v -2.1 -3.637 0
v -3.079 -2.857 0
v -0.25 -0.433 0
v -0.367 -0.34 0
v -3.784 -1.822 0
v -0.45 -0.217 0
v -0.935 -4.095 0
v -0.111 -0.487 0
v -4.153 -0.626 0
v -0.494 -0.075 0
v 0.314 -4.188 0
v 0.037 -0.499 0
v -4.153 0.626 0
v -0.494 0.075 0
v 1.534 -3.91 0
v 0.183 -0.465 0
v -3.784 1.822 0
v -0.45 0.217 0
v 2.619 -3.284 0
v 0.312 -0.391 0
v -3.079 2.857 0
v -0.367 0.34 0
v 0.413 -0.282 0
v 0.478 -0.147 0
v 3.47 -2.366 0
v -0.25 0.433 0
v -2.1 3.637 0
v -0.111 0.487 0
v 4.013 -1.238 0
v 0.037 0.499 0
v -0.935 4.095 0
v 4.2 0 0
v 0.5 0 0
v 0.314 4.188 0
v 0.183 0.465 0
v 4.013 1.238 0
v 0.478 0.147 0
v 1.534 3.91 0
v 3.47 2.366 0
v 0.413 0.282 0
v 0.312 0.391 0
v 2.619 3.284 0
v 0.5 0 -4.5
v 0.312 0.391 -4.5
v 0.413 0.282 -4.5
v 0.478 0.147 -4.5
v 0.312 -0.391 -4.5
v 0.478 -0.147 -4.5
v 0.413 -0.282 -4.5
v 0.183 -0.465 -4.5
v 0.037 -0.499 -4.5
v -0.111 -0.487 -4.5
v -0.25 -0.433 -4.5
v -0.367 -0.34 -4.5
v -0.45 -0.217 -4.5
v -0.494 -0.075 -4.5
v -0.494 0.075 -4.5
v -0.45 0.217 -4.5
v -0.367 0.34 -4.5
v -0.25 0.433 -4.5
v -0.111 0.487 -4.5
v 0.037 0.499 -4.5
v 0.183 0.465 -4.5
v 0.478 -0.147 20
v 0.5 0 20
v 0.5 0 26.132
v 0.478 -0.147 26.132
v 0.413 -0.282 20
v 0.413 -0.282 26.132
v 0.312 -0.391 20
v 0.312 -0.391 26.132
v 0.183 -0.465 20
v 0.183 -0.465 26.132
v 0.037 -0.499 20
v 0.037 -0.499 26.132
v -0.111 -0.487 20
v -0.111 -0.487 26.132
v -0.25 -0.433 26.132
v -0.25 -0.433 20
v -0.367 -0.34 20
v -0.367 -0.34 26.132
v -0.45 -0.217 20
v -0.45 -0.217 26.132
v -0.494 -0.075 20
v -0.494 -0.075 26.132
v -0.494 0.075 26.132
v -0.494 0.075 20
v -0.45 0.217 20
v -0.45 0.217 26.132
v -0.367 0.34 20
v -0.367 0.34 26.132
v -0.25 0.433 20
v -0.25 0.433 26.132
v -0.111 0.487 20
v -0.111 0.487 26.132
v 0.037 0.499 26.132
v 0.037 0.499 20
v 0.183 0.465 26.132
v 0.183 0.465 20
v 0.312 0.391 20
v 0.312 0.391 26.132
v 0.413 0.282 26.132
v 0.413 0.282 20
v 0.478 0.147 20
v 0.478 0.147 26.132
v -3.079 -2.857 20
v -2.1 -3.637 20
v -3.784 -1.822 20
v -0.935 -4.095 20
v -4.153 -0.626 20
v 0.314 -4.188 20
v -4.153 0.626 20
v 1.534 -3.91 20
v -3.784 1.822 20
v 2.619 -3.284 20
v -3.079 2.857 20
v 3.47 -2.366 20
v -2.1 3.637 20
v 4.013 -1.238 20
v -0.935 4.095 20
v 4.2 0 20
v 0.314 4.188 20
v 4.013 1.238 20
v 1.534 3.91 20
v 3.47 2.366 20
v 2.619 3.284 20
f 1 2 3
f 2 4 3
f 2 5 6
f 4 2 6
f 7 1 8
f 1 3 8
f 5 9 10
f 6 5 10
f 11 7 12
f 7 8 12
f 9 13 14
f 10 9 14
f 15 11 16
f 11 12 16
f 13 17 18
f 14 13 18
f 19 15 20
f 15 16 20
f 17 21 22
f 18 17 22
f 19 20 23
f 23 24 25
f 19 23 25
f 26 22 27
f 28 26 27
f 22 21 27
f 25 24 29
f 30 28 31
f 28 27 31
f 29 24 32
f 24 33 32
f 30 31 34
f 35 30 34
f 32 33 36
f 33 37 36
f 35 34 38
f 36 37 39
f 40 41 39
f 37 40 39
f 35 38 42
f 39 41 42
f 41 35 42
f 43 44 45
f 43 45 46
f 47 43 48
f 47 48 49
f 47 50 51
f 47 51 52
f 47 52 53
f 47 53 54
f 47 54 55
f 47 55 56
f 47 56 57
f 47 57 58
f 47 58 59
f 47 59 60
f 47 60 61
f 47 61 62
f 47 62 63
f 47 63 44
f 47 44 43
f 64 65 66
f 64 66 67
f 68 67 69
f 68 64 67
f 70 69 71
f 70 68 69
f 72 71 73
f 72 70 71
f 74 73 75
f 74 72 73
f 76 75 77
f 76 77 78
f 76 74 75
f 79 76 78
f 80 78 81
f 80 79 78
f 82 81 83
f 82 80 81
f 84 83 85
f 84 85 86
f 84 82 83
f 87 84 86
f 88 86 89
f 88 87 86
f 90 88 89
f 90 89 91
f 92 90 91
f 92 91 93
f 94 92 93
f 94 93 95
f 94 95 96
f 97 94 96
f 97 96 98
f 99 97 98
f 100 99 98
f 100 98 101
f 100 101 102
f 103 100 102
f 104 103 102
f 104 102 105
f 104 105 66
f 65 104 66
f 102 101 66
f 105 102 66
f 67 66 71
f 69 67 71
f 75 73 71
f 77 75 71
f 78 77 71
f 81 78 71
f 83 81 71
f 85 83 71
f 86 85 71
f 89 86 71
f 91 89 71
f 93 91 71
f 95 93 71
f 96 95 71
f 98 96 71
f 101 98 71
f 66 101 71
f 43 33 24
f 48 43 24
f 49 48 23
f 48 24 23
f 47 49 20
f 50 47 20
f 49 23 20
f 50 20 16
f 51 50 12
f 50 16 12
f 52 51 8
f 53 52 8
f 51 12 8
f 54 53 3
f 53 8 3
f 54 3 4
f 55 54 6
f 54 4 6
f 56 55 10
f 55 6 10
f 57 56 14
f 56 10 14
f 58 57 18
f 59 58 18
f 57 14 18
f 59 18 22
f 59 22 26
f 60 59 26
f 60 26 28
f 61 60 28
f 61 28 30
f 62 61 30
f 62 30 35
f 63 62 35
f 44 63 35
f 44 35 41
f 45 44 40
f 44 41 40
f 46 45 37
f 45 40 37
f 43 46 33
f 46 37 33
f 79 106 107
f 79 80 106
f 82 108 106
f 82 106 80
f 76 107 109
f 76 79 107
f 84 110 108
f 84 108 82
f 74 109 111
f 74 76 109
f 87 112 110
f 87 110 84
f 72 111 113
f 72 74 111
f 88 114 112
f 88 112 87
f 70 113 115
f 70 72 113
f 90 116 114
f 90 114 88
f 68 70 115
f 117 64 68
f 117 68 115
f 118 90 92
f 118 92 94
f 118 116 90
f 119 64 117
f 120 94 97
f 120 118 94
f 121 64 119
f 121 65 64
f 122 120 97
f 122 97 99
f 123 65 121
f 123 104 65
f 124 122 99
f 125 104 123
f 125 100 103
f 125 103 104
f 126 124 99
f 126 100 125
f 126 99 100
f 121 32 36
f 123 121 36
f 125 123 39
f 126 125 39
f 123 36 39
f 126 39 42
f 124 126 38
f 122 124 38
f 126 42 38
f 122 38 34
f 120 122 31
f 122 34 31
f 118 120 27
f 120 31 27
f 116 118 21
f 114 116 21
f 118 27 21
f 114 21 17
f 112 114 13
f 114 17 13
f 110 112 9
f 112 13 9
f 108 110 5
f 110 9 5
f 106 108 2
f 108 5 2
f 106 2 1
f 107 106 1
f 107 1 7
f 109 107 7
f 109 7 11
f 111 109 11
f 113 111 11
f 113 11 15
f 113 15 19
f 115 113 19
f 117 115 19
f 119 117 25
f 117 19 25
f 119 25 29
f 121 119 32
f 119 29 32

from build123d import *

# Parameters (mm, degrees)
F0_R     = 4.2
F1_DEPTH = 20
F2_R     = 0.5
F3_DEPTH = 4.5
F4_R     = 0.5
F5_DEPTH = 30.6324


with BuildPart() as f1:
    # F0 (on Top) → F1 (new body)
    with BuildSketch(Plane.XY):
        Circle(F0_R)
    extrude(amount=F1_DEPTH)

    # F2 (on face) → F3 (join)
    with BuildSketch(Plane(origin=(0, 0, 0), x_dir=(1, 0, 0), z_dir=(0, 0, -1))):
        Circle(F2_R)
    extrude(amount=F3_DEPTH)

    # F4 (on face) → F5 (join)
    with BuildSketch(Plane(origin=(0, 0, -4.5), x_dir=(1, 0, 0), z_dir=(0, 0, -1))):
        Circle(F4_R)
    extrude(amount=-F5_DEPTH)


solid = f1.part
